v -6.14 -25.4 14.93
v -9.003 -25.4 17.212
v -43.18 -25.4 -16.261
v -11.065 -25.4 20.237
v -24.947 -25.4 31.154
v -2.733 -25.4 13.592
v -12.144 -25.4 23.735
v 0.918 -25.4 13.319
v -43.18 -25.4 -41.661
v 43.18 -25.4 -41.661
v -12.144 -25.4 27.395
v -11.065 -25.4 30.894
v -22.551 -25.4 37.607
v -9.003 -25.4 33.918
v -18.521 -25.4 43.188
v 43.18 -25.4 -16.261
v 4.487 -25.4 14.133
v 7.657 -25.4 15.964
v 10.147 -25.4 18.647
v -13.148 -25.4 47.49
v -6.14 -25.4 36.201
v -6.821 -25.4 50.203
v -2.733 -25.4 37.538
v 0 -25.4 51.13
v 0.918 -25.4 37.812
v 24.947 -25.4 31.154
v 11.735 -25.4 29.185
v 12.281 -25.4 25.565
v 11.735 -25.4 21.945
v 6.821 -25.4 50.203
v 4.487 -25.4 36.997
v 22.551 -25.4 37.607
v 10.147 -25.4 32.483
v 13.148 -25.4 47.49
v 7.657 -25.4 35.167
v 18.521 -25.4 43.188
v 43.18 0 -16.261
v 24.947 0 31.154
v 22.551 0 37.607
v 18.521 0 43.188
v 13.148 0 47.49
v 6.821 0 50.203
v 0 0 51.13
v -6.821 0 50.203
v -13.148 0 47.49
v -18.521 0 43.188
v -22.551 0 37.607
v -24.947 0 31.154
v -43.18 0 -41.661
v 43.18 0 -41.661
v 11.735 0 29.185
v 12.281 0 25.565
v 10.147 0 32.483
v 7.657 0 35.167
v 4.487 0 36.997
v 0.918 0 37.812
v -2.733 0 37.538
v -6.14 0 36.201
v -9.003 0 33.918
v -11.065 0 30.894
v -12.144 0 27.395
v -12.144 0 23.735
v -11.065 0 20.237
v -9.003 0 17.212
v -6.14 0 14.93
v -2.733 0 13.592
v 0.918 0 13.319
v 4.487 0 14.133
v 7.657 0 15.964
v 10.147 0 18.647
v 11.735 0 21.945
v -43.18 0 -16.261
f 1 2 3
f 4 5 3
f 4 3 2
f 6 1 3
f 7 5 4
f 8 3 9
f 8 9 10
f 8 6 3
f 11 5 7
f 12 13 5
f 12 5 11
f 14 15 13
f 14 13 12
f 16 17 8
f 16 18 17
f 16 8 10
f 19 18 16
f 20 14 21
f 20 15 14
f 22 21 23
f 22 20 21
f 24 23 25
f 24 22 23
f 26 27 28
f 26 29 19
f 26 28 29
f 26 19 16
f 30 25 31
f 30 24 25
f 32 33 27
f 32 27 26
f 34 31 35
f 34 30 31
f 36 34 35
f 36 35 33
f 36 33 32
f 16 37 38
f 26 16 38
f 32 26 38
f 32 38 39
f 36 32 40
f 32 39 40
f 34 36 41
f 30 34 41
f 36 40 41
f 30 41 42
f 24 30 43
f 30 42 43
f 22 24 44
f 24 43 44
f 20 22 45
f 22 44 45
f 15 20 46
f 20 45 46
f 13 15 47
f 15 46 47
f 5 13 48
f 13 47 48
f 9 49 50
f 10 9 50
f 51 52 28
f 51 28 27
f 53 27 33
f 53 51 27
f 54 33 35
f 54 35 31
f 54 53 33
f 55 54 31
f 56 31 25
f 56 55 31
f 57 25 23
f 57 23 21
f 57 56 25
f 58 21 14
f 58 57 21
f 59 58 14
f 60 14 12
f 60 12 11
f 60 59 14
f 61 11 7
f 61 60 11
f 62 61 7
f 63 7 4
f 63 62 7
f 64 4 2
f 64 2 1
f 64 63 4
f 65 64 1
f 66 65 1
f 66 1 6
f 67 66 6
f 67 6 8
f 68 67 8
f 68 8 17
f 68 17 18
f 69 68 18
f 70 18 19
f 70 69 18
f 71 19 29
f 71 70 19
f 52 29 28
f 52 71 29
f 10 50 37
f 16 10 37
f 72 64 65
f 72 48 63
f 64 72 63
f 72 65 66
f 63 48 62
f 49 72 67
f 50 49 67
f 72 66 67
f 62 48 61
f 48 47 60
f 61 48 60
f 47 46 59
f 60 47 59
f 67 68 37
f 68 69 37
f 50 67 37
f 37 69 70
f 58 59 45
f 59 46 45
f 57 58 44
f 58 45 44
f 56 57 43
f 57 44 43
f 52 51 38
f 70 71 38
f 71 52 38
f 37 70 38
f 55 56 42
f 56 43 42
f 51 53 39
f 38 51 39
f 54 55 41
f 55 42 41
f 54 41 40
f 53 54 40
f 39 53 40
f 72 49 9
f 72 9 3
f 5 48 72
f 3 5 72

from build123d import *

# Parameters (mm, degrees)
F0_W     = 86.36
F0_H     = 25.4
F0_R     = 12.2809
F1_DEPTH = 25.4


with BuildPart() as f1:
    # F0 (on Front) → F1 (new body)
    with BuildSketch(Plane.XZ):
        with BuildLine():
            ThreePointArc((24.946787, 31.153673), (25.410052, 28.376437), (25.5651, 25.5651))
            ThreePointArc((25.5651, 25.5651), (-2.811337, 0.155048), (-24.946787, 31.153673))
            Line((-24.946787, 31.153673), (-43.18, -16.261408))
            Line((-43.18, -16.261408), (43.18, -16.261408))
            Line((43.18, -16.261408), (24.946787, 31.153673))
        make_face()
        with Locations((0, -28.961408)):
            Rectangle(F0_W, F0_H)
        with BuildLine():
            ThreePointArc((-24.946787, 31.153673), (-2.811337, 0.155048), (25.5651, 25.5651))
            ThreePointArc((25.5651, 25.5651), (25.410052, 28.376437), (24.946787, 31.153673))
            ThreePointArc((24.946787, 31.153673), (0, 51.1302), (-24.946787, 31.153673))
        make_face()
        with Locations((0, 25.5651)):
            Circle(F0_R, mode=Mode.SUBTRACT)
    extrude(amount=F1_DEPTH)


solid = f1.part
